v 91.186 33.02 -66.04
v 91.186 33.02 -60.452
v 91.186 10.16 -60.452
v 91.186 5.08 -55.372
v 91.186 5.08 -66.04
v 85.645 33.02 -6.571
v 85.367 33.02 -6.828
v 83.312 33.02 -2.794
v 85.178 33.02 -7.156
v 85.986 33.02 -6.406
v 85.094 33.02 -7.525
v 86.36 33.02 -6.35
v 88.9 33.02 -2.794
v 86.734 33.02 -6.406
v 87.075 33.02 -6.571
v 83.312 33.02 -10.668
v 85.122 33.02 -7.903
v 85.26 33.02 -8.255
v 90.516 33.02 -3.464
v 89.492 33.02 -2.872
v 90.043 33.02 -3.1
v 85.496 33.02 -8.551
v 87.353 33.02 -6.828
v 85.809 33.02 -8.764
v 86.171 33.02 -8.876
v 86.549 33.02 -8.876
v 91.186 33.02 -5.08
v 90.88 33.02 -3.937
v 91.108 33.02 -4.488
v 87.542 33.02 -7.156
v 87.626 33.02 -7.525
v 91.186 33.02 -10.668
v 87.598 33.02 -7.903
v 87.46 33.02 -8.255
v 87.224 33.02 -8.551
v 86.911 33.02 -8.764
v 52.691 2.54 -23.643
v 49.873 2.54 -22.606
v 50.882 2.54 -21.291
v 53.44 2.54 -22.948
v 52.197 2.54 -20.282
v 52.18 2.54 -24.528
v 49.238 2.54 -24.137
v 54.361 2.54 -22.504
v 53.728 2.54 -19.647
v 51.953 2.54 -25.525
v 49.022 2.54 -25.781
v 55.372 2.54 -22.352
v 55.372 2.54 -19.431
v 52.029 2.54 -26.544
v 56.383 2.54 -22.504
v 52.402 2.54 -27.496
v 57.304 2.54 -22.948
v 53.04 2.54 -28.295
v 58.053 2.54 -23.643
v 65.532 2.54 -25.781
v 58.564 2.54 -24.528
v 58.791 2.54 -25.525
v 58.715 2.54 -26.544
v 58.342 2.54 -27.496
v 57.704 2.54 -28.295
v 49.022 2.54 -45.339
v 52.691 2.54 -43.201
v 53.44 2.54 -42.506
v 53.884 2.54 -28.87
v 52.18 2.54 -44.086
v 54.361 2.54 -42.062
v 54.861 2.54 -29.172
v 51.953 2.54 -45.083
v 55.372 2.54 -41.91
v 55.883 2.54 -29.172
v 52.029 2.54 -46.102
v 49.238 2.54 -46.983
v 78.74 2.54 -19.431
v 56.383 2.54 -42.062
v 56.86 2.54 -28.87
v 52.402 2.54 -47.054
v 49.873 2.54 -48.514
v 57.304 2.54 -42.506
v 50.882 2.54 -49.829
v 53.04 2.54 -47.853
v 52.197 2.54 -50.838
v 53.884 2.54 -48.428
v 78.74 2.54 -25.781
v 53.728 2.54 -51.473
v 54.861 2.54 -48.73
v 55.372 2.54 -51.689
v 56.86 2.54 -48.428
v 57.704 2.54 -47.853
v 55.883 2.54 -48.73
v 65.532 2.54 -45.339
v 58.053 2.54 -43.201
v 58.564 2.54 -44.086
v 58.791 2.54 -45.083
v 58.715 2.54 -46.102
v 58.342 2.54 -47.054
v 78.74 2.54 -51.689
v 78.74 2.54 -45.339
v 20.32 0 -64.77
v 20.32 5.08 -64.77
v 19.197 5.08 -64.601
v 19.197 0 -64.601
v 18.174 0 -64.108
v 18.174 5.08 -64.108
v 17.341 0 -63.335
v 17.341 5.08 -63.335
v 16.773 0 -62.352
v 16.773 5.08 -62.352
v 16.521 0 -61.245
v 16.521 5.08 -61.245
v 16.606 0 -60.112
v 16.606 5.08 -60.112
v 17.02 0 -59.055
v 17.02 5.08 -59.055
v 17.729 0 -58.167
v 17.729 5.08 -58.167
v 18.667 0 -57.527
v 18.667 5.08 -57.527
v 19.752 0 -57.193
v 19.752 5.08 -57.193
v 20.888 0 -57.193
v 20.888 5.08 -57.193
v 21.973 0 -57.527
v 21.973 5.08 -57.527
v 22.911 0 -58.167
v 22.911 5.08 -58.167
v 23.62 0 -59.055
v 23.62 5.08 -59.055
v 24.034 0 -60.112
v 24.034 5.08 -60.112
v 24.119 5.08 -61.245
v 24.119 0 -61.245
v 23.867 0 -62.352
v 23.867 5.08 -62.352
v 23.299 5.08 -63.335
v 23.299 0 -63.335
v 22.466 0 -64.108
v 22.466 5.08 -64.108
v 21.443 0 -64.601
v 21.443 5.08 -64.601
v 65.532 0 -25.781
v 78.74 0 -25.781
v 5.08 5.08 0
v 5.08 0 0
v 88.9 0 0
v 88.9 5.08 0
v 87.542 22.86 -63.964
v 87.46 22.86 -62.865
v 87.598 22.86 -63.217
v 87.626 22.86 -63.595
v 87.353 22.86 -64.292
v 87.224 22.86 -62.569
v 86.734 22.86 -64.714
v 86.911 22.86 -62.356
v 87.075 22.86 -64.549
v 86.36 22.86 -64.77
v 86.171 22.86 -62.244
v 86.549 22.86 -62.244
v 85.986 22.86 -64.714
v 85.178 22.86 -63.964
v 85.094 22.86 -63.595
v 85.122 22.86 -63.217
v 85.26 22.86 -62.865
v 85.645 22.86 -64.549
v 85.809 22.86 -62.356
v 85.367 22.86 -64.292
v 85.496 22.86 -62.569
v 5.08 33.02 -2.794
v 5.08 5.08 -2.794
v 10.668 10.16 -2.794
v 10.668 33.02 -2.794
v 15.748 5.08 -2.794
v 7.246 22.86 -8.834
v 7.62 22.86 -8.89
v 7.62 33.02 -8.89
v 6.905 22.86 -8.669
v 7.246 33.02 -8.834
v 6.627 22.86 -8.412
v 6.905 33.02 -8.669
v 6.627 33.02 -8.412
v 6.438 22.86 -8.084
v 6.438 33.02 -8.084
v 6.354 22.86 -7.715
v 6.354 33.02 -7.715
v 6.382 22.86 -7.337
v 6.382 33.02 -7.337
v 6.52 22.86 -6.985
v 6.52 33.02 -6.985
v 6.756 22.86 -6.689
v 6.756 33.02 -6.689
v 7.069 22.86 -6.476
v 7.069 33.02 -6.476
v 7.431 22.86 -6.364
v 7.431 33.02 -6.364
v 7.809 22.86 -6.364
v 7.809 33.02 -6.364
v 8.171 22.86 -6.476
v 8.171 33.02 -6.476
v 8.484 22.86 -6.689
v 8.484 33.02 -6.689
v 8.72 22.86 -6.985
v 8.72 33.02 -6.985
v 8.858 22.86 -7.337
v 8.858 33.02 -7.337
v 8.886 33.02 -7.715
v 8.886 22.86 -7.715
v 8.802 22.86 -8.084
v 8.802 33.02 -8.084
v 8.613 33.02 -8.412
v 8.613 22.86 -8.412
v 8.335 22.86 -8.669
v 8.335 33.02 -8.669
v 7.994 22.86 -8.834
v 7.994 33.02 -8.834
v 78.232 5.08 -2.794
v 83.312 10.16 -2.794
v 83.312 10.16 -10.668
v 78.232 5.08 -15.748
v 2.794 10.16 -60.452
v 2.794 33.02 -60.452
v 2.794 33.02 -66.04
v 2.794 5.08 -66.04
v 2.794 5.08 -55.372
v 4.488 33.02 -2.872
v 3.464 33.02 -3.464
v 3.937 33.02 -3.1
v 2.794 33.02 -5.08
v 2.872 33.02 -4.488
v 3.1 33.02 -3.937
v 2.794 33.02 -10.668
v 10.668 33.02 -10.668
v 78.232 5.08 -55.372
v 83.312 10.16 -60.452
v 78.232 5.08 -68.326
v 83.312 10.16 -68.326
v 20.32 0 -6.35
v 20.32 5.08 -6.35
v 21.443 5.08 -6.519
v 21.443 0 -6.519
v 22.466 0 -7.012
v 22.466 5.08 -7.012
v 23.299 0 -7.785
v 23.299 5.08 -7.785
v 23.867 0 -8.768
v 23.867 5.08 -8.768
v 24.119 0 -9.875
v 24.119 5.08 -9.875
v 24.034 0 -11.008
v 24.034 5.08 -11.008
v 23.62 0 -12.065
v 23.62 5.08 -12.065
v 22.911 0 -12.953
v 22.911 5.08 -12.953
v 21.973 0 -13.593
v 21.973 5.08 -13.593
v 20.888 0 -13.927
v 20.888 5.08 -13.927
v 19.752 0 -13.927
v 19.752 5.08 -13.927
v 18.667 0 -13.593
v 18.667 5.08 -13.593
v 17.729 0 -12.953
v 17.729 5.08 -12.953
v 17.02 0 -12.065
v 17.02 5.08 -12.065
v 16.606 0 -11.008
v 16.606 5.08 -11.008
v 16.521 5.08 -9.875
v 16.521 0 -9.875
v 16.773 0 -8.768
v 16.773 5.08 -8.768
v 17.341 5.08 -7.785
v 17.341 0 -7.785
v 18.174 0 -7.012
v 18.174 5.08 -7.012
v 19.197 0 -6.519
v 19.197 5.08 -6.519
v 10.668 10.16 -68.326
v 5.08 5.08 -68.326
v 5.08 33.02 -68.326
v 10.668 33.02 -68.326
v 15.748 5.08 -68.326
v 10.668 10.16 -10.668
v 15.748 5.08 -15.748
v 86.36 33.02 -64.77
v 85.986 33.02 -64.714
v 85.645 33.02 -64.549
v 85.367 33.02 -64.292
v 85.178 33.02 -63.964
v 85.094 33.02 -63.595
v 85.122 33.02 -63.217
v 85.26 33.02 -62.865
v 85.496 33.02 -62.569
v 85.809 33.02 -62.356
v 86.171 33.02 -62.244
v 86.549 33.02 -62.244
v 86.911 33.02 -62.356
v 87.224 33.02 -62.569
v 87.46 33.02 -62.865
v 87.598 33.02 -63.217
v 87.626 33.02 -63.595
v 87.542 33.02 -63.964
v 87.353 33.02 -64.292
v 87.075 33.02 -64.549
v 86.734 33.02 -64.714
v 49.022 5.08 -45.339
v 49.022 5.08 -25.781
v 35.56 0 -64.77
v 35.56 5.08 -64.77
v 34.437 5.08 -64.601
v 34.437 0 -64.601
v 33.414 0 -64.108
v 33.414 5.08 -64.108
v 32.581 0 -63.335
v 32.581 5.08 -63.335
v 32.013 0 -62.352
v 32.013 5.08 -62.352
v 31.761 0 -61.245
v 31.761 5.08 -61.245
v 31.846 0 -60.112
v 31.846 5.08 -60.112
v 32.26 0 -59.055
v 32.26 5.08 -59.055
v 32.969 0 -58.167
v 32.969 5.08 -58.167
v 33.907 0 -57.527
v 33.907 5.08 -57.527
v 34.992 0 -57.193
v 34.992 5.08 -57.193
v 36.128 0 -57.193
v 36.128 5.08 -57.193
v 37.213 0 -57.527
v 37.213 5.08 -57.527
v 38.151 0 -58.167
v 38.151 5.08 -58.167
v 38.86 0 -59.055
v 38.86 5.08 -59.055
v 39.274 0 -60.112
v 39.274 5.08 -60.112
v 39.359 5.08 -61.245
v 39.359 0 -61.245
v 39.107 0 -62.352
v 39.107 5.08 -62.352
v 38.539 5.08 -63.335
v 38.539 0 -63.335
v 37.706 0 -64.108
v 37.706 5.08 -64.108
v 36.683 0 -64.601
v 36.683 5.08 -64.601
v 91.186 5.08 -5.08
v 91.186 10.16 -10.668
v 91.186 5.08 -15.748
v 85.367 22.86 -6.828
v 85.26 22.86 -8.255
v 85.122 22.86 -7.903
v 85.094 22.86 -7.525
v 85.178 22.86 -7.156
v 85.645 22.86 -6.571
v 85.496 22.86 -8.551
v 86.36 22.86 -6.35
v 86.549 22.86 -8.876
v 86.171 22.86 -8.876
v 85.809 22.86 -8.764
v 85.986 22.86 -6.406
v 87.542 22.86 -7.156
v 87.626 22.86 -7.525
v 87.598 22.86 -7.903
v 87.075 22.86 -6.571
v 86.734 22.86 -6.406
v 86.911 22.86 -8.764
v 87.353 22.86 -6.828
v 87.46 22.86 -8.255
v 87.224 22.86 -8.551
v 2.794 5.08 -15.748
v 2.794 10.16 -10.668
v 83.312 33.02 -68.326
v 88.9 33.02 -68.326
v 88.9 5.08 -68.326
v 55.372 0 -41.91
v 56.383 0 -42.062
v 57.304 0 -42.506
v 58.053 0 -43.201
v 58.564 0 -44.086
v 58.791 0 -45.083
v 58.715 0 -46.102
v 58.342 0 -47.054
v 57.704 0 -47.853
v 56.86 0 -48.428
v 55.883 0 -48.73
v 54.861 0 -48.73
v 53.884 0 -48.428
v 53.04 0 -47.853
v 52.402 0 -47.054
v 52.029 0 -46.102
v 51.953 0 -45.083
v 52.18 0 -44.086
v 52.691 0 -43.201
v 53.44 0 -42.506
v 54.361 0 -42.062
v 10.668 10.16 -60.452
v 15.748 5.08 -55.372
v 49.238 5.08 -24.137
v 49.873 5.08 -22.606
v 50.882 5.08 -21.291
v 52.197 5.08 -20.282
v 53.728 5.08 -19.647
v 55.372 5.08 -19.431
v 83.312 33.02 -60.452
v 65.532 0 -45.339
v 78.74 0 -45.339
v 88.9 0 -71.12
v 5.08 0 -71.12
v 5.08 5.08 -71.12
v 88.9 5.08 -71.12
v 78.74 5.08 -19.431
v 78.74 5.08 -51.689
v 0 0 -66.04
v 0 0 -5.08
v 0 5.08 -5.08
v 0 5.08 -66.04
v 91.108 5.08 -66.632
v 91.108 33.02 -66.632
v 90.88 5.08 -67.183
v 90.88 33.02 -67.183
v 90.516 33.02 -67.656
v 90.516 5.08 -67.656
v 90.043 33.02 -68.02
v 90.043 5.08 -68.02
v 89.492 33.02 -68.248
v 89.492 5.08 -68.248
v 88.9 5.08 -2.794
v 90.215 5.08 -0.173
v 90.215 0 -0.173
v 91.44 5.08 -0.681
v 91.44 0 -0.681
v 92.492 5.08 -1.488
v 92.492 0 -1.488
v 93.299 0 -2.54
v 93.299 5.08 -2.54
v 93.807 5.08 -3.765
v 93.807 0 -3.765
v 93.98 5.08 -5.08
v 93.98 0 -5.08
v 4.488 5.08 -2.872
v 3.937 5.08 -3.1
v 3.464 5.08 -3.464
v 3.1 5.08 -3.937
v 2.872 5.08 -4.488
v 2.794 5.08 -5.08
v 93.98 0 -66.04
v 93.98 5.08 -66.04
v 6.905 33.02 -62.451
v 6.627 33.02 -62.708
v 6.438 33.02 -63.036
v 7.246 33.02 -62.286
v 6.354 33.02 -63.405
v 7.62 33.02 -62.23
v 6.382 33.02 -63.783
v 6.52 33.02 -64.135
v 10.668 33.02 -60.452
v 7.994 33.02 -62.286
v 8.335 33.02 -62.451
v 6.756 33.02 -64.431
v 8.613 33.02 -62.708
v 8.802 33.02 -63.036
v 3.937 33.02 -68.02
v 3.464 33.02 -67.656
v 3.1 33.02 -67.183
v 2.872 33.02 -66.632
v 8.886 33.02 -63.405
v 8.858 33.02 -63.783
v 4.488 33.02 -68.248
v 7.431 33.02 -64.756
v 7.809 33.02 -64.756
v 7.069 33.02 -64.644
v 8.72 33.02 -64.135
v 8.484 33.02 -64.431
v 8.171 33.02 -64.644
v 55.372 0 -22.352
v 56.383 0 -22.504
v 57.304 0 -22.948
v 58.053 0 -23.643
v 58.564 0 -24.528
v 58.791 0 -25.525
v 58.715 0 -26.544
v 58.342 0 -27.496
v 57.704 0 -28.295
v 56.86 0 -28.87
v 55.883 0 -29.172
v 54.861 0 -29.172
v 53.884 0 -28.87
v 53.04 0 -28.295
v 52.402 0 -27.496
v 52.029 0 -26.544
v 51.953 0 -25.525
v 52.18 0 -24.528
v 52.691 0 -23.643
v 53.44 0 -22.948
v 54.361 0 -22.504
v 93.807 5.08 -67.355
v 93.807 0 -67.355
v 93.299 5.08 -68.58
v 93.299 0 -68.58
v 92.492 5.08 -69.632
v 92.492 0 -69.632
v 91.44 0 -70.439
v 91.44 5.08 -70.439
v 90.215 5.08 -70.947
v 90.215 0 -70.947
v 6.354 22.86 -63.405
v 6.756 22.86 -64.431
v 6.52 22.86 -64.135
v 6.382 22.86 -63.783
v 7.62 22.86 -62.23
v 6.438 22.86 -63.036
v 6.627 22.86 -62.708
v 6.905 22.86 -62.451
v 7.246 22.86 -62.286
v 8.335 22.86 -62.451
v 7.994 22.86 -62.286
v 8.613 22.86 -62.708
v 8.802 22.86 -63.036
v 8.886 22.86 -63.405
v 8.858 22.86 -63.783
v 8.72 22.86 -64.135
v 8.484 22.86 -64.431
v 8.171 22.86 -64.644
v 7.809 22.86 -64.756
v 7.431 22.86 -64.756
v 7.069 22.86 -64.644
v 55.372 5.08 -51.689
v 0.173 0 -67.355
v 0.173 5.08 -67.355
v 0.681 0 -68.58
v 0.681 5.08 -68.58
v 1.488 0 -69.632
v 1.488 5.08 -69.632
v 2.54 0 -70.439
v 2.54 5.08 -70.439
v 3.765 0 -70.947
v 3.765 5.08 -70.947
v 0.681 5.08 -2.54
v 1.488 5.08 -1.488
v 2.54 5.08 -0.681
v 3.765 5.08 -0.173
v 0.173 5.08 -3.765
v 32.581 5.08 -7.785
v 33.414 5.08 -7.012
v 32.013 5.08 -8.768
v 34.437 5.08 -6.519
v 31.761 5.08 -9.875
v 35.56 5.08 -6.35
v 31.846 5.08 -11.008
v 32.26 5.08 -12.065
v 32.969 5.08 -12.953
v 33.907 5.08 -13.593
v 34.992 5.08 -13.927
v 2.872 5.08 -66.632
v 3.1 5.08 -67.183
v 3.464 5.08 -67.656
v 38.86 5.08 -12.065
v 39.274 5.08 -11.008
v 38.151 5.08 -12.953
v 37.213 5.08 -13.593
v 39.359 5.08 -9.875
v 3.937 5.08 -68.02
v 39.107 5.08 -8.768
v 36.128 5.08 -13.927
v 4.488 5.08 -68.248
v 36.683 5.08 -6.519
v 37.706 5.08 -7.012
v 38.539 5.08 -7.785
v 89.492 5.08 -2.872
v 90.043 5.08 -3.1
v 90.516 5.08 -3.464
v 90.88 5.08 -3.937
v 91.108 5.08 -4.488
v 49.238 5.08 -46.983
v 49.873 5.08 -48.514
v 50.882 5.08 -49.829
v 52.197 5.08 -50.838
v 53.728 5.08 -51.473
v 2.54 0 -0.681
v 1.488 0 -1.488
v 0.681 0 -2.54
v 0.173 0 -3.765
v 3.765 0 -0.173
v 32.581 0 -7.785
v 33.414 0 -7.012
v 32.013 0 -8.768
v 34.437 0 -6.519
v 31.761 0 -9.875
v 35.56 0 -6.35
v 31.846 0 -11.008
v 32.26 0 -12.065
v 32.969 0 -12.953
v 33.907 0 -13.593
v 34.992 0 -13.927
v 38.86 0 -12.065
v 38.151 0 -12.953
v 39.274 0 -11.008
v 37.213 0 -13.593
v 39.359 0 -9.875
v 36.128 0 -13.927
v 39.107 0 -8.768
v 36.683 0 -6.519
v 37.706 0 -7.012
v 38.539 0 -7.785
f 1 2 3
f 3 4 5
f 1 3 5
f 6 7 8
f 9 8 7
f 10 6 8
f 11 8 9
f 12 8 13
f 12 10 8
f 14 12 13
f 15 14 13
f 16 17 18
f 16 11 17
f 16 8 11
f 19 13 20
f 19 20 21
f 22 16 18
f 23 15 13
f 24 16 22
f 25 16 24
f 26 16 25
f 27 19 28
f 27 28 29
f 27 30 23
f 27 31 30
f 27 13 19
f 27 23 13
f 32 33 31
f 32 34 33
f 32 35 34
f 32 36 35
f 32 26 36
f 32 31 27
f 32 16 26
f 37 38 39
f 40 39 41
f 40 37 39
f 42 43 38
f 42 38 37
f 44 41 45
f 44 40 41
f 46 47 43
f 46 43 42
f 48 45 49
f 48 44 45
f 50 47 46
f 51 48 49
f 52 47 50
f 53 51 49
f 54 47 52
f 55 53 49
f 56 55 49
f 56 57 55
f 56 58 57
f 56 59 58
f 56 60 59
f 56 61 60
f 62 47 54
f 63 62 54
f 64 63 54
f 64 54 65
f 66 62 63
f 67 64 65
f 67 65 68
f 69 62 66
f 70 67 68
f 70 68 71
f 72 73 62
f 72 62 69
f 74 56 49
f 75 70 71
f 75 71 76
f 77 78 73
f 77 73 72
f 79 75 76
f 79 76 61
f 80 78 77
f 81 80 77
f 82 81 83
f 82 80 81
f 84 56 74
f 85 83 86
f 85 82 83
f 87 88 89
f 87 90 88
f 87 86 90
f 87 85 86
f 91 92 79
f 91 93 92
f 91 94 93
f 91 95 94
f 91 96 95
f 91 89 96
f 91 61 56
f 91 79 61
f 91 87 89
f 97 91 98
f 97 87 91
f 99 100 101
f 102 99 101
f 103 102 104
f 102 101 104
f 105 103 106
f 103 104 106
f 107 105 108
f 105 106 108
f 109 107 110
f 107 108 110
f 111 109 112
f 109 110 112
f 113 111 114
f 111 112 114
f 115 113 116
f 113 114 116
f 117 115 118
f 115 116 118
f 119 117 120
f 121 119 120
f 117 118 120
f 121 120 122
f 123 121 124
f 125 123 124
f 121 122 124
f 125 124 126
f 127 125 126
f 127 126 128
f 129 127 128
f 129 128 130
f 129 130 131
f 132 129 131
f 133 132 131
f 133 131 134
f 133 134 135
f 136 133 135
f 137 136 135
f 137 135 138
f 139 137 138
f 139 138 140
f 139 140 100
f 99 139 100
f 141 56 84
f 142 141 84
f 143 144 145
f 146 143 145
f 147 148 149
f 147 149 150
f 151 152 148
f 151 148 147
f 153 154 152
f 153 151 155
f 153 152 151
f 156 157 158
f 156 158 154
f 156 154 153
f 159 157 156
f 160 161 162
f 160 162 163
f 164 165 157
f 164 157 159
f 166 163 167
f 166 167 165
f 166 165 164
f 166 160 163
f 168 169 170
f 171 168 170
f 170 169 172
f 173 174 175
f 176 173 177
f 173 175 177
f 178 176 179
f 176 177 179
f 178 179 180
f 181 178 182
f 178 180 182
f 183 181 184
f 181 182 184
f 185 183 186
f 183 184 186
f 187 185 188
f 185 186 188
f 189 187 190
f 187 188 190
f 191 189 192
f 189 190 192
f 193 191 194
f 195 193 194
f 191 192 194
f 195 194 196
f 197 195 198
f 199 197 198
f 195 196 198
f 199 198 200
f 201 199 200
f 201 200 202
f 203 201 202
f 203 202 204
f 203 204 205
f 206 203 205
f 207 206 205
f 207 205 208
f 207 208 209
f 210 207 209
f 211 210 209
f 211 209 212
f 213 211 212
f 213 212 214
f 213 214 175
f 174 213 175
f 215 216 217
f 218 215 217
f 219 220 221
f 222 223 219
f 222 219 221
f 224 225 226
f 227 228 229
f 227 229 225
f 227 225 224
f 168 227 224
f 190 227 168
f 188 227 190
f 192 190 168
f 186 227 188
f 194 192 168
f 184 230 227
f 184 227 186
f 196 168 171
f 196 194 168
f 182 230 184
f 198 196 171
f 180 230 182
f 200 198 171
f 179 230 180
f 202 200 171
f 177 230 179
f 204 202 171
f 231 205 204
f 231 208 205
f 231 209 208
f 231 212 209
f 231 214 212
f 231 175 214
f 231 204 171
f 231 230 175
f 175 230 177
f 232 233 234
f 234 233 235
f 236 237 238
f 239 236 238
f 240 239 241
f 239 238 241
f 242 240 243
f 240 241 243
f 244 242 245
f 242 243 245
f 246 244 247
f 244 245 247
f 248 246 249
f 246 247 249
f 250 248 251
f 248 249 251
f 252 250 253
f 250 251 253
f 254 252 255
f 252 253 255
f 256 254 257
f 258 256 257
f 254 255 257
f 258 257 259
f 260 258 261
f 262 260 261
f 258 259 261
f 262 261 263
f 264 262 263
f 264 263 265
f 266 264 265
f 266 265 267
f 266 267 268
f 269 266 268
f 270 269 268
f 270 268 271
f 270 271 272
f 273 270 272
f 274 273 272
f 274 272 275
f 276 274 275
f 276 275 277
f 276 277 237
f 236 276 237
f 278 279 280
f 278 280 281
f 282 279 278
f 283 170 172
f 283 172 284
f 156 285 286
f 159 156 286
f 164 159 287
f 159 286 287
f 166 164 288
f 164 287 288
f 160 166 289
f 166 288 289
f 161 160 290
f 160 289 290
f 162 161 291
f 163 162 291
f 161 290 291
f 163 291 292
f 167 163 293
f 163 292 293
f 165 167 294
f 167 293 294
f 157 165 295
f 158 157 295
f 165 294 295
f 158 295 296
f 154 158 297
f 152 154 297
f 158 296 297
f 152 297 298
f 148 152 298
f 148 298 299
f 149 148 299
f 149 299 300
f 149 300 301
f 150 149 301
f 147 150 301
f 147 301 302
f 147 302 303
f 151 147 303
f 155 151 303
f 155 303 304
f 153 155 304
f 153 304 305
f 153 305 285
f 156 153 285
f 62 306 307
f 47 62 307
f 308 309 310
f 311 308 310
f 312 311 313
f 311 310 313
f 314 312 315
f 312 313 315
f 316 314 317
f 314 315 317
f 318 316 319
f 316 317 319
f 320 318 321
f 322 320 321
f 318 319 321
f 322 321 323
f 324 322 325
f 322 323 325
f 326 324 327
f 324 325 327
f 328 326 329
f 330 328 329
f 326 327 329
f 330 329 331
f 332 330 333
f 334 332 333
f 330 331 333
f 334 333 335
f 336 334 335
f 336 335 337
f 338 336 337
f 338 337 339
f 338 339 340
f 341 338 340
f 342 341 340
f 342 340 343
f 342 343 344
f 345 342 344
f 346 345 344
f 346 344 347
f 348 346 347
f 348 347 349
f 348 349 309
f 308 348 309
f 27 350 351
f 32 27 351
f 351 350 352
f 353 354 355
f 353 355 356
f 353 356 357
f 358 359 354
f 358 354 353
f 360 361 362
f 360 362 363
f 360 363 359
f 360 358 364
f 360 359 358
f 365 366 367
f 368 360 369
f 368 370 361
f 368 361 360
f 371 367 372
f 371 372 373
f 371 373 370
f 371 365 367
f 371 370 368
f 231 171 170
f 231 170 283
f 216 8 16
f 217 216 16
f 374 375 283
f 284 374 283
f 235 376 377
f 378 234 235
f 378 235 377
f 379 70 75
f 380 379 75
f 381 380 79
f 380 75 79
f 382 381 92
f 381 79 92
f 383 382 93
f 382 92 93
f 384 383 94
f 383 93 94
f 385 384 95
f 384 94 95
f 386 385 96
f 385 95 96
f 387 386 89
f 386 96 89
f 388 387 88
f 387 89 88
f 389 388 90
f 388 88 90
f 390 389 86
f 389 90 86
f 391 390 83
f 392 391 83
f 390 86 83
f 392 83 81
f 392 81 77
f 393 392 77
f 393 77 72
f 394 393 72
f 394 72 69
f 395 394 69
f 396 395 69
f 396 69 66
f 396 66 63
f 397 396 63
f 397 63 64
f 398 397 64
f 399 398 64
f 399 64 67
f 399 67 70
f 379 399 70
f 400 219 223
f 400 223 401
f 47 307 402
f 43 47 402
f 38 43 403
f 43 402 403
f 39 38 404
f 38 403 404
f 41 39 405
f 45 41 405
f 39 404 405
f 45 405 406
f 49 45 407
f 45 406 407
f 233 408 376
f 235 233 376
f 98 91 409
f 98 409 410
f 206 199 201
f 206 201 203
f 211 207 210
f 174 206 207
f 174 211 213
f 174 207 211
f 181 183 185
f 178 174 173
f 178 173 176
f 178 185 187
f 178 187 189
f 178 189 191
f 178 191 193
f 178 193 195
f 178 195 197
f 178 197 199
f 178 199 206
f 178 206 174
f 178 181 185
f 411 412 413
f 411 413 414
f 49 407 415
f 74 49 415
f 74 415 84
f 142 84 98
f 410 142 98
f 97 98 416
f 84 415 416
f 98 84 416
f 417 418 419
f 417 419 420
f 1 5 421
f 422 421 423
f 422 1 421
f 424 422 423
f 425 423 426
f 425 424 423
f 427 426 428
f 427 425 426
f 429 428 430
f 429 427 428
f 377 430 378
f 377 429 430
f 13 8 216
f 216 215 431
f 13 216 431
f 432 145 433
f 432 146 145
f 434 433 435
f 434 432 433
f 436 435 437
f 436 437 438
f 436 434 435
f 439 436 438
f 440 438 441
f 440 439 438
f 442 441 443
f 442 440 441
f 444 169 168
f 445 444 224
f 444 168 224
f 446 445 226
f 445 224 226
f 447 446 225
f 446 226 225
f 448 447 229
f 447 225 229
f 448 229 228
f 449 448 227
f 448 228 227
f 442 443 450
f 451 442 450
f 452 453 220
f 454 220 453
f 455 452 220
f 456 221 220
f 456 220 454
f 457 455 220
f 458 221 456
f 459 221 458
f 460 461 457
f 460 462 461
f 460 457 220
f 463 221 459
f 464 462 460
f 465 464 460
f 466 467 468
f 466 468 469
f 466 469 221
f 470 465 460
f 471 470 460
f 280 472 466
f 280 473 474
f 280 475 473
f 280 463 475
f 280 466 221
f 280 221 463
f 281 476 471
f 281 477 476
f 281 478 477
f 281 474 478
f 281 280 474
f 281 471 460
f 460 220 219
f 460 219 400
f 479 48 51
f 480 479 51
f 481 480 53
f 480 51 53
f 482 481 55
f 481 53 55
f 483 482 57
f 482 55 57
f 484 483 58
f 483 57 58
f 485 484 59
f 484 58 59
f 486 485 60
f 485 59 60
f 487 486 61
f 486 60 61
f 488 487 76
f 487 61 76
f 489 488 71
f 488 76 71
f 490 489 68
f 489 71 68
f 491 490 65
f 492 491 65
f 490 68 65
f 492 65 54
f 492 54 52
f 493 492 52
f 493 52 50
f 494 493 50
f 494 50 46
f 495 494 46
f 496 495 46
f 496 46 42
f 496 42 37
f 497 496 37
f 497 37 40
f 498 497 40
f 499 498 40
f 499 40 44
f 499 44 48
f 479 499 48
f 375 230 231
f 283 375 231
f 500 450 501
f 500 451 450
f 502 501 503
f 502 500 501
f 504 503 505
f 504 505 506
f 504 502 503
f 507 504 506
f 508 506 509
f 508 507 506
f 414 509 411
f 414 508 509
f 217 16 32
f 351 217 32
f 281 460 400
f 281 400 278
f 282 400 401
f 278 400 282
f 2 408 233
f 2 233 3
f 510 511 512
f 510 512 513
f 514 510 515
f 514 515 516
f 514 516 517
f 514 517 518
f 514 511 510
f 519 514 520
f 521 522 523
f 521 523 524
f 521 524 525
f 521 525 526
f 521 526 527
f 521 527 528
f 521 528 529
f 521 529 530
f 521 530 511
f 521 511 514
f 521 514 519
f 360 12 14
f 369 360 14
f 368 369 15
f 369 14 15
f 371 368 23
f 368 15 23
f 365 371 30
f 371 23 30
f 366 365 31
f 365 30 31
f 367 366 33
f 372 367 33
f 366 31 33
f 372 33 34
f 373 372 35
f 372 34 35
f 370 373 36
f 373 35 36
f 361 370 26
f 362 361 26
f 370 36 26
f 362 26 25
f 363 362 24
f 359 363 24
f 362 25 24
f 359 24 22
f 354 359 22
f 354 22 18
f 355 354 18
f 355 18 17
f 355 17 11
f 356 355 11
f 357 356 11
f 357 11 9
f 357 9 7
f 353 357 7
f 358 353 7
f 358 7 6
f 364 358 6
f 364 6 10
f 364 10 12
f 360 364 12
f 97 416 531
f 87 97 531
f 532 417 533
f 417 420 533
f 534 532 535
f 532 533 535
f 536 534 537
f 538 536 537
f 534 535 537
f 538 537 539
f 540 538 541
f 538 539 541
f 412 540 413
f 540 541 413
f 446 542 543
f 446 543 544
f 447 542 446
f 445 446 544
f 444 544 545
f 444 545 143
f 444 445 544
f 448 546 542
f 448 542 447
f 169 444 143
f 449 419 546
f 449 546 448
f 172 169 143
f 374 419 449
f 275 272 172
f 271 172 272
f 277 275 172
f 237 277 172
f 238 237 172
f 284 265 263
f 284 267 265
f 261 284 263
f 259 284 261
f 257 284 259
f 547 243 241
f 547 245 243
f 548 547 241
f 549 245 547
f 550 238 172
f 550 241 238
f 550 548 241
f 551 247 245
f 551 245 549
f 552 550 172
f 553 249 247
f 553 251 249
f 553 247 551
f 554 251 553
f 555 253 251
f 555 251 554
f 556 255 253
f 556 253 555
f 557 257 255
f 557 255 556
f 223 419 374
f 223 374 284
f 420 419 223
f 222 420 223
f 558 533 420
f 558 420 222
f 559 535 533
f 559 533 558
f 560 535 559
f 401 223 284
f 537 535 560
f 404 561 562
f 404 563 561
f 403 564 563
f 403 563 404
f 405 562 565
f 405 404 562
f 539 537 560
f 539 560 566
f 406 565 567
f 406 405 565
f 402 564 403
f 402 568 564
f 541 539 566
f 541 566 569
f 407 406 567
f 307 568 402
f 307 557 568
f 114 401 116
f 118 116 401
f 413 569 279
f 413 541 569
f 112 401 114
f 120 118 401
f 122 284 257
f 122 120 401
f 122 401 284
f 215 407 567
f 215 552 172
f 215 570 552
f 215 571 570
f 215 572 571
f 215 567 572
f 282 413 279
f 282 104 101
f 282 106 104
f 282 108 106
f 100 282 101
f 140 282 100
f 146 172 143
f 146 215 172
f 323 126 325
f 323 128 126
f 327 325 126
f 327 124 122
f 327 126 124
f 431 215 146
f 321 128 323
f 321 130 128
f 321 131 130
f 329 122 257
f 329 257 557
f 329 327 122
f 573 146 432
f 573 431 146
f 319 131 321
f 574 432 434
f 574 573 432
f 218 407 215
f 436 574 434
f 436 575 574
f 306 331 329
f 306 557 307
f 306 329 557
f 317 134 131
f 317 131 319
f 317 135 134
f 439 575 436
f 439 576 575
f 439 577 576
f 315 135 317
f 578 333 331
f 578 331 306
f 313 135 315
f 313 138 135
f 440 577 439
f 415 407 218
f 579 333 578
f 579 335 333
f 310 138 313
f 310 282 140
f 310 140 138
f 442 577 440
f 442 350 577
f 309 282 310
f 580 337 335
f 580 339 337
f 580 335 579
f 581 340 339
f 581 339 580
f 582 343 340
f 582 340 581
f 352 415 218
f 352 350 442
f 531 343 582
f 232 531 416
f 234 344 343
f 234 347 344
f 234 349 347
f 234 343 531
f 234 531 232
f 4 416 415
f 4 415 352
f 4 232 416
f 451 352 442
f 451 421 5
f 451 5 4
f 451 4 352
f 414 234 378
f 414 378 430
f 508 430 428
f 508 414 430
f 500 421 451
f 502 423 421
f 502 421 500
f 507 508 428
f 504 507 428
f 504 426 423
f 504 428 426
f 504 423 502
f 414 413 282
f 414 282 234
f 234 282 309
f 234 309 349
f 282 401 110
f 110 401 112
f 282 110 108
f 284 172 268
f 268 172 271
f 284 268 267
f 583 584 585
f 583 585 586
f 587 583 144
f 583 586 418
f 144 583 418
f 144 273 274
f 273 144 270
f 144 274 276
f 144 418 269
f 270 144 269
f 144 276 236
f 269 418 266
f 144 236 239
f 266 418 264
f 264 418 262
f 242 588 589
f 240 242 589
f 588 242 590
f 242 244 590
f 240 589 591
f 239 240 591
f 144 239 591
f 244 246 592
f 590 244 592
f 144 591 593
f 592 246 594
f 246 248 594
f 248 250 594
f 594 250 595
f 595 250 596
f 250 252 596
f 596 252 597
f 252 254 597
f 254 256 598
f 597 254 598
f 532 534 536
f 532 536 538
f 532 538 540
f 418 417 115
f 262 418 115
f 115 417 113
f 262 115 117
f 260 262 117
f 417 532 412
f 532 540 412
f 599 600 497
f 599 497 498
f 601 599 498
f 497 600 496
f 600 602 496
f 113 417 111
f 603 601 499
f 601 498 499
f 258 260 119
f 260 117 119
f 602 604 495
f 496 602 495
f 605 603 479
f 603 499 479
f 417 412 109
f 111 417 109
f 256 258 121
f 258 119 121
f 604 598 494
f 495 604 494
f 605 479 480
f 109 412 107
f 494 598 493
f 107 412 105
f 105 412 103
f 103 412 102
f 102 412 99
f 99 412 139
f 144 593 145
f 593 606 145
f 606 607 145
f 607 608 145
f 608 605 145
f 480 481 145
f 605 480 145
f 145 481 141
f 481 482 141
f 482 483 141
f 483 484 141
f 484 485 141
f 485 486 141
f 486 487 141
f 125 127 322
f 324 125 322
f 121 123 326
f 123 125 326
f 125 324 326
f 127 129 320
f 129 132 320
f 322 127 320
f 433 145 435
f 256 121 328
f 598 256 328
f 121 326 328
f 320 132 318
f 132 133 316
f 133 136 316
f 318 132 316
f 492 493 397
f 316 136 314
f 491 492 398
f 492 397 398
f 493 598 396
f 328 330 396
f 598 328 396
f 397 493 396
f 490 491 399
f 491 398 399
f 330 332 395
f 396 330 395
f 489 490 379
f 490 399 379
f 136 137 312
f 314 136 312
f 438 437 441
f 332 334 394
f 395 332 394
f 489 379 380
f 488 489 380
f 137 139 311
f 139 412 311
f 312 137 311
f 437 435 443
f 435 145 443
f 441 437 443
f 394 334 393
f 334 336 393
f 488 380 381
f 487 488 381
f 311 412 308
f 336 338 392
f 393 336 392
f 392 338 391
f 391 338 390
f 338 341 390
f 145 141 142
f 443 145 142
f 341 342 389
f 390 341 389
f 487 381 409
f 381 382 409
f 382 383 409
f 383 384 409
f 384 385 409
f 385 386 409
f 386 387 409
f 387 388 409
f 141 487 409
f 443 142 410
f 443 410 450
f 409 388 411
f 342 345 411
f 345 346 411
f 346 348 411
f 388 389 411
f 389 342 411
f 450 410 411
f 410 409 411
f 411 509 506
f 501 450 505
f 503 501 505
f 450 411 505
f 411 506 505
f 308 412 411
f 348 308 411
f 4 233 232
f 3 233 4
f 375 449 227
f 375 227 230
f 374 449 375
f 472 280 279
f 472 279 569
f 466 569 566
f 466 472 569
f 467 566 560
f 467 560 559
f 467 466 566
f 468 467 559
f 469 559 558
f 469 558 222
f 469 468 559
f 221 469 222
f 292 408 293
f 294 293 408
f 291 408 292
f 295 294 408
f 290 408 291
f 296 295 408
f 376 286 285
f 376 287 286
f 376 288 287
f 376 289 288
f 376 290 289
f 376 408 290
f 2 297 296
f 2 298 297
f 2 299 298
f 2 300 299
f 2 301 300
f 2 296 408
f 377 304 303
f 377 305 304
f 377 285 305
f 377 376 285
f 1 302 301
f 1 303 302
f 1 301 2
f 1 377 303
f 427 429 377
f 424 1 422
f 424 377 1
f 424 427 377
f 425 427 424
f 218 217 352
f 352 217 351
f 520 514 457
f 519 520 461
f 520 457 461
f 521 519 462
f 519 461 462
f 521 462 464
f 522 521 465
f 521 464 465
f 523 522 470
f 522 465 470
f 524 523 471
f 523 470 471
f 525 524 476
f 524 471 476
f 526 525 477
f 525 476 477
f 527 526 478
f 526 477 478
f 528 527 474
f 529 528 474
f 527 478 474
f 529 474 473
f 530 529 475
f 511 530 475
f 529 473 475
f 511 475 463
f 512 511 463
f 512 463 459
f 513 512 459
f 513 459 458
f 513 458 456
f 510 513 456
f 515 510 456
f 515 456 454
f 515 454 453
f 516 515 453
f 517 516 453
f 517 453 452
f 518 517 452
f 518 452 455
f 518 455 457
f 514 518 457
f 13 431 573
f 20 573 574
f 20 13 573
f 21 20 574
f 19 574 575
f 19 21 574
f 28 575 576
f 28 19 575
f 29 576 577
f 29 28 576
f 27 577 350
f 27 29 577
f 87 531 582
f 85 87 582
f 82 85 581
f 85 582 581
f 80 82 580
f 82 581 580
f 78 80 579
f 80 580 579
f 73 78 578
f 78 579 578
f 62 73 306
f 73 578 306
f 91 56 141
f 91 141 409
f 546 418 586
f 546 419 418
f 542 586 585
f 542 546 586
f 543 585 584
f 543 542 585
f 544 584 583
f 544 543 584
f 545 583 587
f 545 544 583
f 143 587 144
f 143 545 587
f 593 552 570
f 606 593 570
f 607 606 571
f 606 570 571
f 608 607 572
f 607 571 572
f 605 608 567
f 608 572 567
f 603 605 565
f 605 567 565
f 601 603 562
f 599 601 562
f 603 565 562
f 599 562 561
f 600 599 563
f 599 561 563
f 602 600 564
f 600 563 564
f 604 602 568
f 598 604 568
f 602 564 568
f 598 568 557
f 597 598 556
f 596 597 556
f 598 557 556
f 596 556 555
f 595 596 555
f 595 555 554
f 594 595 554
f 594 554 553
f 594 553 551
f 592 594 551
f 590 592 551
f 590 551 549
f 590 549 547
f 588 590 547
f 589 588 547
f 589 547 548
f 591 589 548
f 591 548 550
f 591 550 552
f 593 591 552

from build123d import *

# Parameters (mm, degrees)
SKETCH1_W           = 93.98
SKETCH1_H           = 71.12
BOSS_EXTRUDE1_DEPTH = 5.08
FILLET4_R           = 5.08
CUT_EXTRUDE5_REACH  = 119.967
SKETCH7_R           = 3.429
SKETCH7_W           = 13.208
SKETCH7_H           = 19.558
CUT_EXTRUDE7_DEPTH  = 2.54
CUT_EXTRUDE8_REACH  = 119.967
SKETCH8_R           = 3.81
SKETCH2_W           = 7.874
SKETCH2_H           = 7.874
BOSS_EXTRUDE3_DEPTH = 30.48
SKETCH10_R          = 1.27
CUT_EXTRUDE9_DEPTH  = 12.7
FILLET5_R           = 2.286
CHAMFER4_SIZE       = 5.08
SKETCH11_W          = 103.535361548
SKETCH11_H          = 78.086950251
CUT_EXTRUDE10_DEPTH = 2.54


with BuildPart() as part:
    # Sketch1 → Boss-Extrude1 (new body)
    with BuildSketch(Plane(origin=(0, 0, 0), x_dir=(1, 0, 0), z_dir=(0, 1, 0))):
        with Locations((46.99, 35.56)):
            Rectangle(SKETCH1_W, SKETCH1_H)
    extrude(amount=BOSS_EXTRUDE1_DEPTH)

    # Fillet4
    fillet4_edges = [part.edges().sort_by_distance(p)[0] for p in [
        (0, 2.54, -71.12),
        (93.98, 2.54, -71.12),
        (93.98, 2.54, 0),
        (0, 2.54, 0),
    ]]
    fillet(fillet4_edges, radius=FILLET4_R)

    # Sketch7 → Cut-Extrude5 (cut, up to next)
    with BuildSketch(Plane(origin=(0, 5.08, 0), x_dir=(1, 0, 0), z_dir=(0, 1, 0)), mode=Mode.PRIVATE) as cut_extrude5_sk1:
        with Locations(Location((55.372, 45.339, 0), (0, 0, 270))):
            Circle(SKETCH7_R)
    cut_extrude5_tool1 = extrude(cut_extrude5_sk1.sketch, amount=-CUT_EXTRUDE5_REACH, mode=Mode.PRIVATE) & part.part
    # Sketch7 → Cut-Extrude5 (cut, up to next)
    with BuildSketch(Plane(origin=(0, 5.08, 0), x_dir=(1, 0, 0), z_dir=(0, 1, 0)), mode=Mode.PRIVATE) as cut_extrude5_sk2:
        with Locations(Location((55.372, 25.781, 0), (0, 0, 270))):
            Circle(SKETCH7_R)
    cut_extrude5_tool2 = extrude(cut_extrude5_sk2.sketch, amount=-CUT_EXTRUDE5_REACH, mode=Mode.PRIVATE) & part.part
    # Sketch7 → Cut-Extrude5 (cut, up to next)
    with BuildSketch(Plane(origin=(0, 5.08, 0), x_dir=(1, 0, 0), z_dir=(0, 1, 0)), mode=Mode.PRIVATE) as cut_extrude5_sk3:
        with Locations((72.136, 35.56)):
            Rectangle(SKETCH7_W, SKETCH7_H)
    cut_extrude5_tool3 = extrude(cut_extrude5_sk3.sketch, amount=-CUT_EXTRUDE5_REACH, mode=Mode.PRIVATE) & part.part
    add(cut_extrude5_tool1.solids().sort_by_distance((55.372, 5.08, -45.339))[0], mode=Mode.SUBTRACT)
    add(cut_extrude5_tool2.solids().sort_by_distance((55.372, 5.08, -25.781))[0], mode=Mode.SUBTRACT)
    add(cut_extrude5_tool3.solids().sort_by_distance((72.136, 5.08, -35.56))[0], mode=Mode.SUBTRACT)

    # Sketch9 → Cut-Extrude7 (cut)
    with BuildSketch(Plane(origin=(0, 5.08, 0), x_dir=(1, 0, 0), z_dir=(0, 1, 0))):
        with BuildLine():
            Line((49.022, 45.339), (49.022, 25.781))
            ThreePointArc((49.022, 25.781), (50.881871939, 21.290871939), (55.372, 19.431))
            Line((55.372, 19.431), (65.532, 19.431))
            Line((65.532, 19.431), (78.74, 19.431))
            Line((78.74, 19.431), (78.74, 51.689))
            Line((78.74, 51.689), (65.532, 51.689))
            Line((65.532, 51.689), (55.372, 51.689))
            ThreePointArc((55.372, 51.689), (50.881871939, 49.829128061), (49.022, 45.339))
        make_face()
    extrude(amount=-CUT_EXTRUDE7_DEPTH, mode=Mode.SUBTRACT)

    # Sketch8 → Cut-Extrude8 (cut, up to next)
    with BuildSketch(Plane(origin=(0, 5.08, 0), x_dir=(1, 0, 0), z_dir=(0, 1, 0)), mode=Mode.PRIVATE) as cut_extrude8_sk1:
        with Locations(Location((20.32, 10.16, 0), (0, 0, 270))):
            Circle(SKETCH8_R)
    cut_extrude8_tool1 = extrude(cut_extrude8_sk1.sketch, amount=-CUT_EXTRUDE8_REACH, mode=Mode.PRIVATE) & part.part
    # Sketch8 → Cut-Extrude8 (cut, up to next)
    with BuildSketch(Plane(origin=(0, 5.08, 0), x_dir=(1, 0, 0), z_dir=(0, 1, 0)), mode=Mode.PRIVATE) as cut_extrude8_sk2:
        with Locations(Location((35.56, 10.16, 0), (0, 0, 270))):
            Circle(SKETCH8_R)
    cut_extrude8_tool2 = extrude(cut_extrude8_sk2.sketch, amount=-CUT_EXTRUDE8_REACH, mode=Mode.PRIVATE) & part.part
    # Sketch8 → Cut-Extrude8 (cut, up to next)
    with BuildSketch(Plane(origin=(0, 5.08, 0), x_dir=(1, 0, 0), z_dir=(0, 1, 0)), mode=Mode.PRIVATE) as cut_extrude8_sk3:
        with Locations(Location((35.56, 60.96, 0), (0, 0, 90))):
            Circle(SKETCH8_R)
    cut_extrude8_tool3 = extrude(cut_extrude8_sk3.sketch, amount=-CUT_EXTRUDE8_REACH, mode=Mode.PRIVATE) & part.part
    # Sketch8 → Cut-Extrude8 (cut, up to next)
    with BuildSketch(Plane(origin=(0, 5.08, 0), x_dir=(1, 0, 0), z_dir=(0, 1, 0)), mode=Mode.PRIVATE) as cut_extrude8_sk4:
        with Locations(Location((20.32, 60.96, 0), (0, 0, 90))):
            Circle(SKETCH8_R)
    cut_extrude8_tool4 = extrude(cut_extrude8_sk4.sketch, amount=-CUT_EXTRUDE8_REACH, mode=Mode.PRIVATE) & part.part
    add(cut_extrude8_tool1.solids().sort_by_distance((20.32, 5.08, -10.16))[0], mode=Mode.SUBTRACT)
    add(cut_extrude8_tool2.solids().sort_by_distance((35.56, 5.08, -10.16))[0], mode=Mode.SUBTRACT)
    add(cut_extrude8_tool3.solids().sort_by_distance((35.56, 5.08, -60.96))[0], mode=Mode.SUBTRACT)
    add(cut_extrude8_tool4.solids().sort_by_distance((20.32, 5.08, -60.96))[0], mode=Mode.SUBTRACT)

    # Sketch2 → Boss-Extrude3 (add)
    with BuildSketch(Plane(origin=(0, 5.08, 0), x_dir=(1, 0, 0), z_dir=(0, 1, 0))):
        with Locations((6.731, 64.389)):
            Rectangle(SKETCH2_W, SKETCH2_H)
        with Locations((87.249, 64.389)):
            Rectangle(SKETCH2_W, SKETCH2_H)
        with Locations((87.249, 6.731)):
            Rectangle(SKETCH2_W, SKETCH2_H)
        with Locations((6.731, 6.731)):
            Rectangle(SKETCH2_W, SKETCH2_H)
    extrude(amount=BOSS_EXTRUDE3_DEPTH)

    # Sketch10 → Cut-Extrude9 (cut)
    with BuildSketch(Plane(origin=(0, 35.56, 0), x_dir=(1, 0, 0), z_dir=(0, 1, 0))):
        with Locations(Location((7.62, 63.5, 0), (0, 0, 270))):
            Circle(SKETCH10_R)
        with Locations(Location((86.36, 63.5, 0), (0, 0, 90))):
            Circle(SKETCH10_R)
        with Locations(Location((86.36, 7.62, 0), (0, 0, 270))):
            Circle(SKETCH10_R)
        with Locations(Location((7.62, 7.62, 0), (0, 0, 90))):
            Circle(SKETCH10_R)
    extrude(amount=-CUT_EXTRUDE9_DEPTH, mode=Mode.SUBTRACT)

    # Fillet5
    fillet5_edges = [part.edges().sort_by_distance(p)[0] for p in [
        (2.794, 20.32, -68.326),
        (91.186, 20.32, -68.326),
        (91.186, 20.32, -2.794),
        (2.794, 20.32, -2.794),
    ]]
    fillet(fillet5_edges, radius=FILLET5_R)

    # Chamfer4
    chamfer4_edges = [part.edges().sort_by_distance(p)[0] for p in [
        (6.731, 5.08, -60.452),
        (10.668, 5.08, -64.389),
        (83.312, 5.08, -64.389),
        (87.249, 5.08, -60.452),
        (87.249, 5.08, -10.668),
        (83.312, 5.08, -6.731),
        (10.668, 5.08, -6.731),
        (6.731, 5.08, -10.668),
    ]]
    chamfer(chamfer4_edges, length=CHAMFER4_SIZE)

    # Sketch11 → Cut-Extrude10 (cut)
    with BuildSketch(Plane(origin=(0, 35.56, 0), x_dir=(1, 0, 0), z_dir=(0, 1, 0))):
        with Locations((47.570572121, 35.36647596)):
            Rectangle(SKETCH11_W, SKETCH11_H)
    extrude(amount=-CUT_EXTRUDE10_DEPTH, mode=Mode.SUBTRACT)


solid = part.part
